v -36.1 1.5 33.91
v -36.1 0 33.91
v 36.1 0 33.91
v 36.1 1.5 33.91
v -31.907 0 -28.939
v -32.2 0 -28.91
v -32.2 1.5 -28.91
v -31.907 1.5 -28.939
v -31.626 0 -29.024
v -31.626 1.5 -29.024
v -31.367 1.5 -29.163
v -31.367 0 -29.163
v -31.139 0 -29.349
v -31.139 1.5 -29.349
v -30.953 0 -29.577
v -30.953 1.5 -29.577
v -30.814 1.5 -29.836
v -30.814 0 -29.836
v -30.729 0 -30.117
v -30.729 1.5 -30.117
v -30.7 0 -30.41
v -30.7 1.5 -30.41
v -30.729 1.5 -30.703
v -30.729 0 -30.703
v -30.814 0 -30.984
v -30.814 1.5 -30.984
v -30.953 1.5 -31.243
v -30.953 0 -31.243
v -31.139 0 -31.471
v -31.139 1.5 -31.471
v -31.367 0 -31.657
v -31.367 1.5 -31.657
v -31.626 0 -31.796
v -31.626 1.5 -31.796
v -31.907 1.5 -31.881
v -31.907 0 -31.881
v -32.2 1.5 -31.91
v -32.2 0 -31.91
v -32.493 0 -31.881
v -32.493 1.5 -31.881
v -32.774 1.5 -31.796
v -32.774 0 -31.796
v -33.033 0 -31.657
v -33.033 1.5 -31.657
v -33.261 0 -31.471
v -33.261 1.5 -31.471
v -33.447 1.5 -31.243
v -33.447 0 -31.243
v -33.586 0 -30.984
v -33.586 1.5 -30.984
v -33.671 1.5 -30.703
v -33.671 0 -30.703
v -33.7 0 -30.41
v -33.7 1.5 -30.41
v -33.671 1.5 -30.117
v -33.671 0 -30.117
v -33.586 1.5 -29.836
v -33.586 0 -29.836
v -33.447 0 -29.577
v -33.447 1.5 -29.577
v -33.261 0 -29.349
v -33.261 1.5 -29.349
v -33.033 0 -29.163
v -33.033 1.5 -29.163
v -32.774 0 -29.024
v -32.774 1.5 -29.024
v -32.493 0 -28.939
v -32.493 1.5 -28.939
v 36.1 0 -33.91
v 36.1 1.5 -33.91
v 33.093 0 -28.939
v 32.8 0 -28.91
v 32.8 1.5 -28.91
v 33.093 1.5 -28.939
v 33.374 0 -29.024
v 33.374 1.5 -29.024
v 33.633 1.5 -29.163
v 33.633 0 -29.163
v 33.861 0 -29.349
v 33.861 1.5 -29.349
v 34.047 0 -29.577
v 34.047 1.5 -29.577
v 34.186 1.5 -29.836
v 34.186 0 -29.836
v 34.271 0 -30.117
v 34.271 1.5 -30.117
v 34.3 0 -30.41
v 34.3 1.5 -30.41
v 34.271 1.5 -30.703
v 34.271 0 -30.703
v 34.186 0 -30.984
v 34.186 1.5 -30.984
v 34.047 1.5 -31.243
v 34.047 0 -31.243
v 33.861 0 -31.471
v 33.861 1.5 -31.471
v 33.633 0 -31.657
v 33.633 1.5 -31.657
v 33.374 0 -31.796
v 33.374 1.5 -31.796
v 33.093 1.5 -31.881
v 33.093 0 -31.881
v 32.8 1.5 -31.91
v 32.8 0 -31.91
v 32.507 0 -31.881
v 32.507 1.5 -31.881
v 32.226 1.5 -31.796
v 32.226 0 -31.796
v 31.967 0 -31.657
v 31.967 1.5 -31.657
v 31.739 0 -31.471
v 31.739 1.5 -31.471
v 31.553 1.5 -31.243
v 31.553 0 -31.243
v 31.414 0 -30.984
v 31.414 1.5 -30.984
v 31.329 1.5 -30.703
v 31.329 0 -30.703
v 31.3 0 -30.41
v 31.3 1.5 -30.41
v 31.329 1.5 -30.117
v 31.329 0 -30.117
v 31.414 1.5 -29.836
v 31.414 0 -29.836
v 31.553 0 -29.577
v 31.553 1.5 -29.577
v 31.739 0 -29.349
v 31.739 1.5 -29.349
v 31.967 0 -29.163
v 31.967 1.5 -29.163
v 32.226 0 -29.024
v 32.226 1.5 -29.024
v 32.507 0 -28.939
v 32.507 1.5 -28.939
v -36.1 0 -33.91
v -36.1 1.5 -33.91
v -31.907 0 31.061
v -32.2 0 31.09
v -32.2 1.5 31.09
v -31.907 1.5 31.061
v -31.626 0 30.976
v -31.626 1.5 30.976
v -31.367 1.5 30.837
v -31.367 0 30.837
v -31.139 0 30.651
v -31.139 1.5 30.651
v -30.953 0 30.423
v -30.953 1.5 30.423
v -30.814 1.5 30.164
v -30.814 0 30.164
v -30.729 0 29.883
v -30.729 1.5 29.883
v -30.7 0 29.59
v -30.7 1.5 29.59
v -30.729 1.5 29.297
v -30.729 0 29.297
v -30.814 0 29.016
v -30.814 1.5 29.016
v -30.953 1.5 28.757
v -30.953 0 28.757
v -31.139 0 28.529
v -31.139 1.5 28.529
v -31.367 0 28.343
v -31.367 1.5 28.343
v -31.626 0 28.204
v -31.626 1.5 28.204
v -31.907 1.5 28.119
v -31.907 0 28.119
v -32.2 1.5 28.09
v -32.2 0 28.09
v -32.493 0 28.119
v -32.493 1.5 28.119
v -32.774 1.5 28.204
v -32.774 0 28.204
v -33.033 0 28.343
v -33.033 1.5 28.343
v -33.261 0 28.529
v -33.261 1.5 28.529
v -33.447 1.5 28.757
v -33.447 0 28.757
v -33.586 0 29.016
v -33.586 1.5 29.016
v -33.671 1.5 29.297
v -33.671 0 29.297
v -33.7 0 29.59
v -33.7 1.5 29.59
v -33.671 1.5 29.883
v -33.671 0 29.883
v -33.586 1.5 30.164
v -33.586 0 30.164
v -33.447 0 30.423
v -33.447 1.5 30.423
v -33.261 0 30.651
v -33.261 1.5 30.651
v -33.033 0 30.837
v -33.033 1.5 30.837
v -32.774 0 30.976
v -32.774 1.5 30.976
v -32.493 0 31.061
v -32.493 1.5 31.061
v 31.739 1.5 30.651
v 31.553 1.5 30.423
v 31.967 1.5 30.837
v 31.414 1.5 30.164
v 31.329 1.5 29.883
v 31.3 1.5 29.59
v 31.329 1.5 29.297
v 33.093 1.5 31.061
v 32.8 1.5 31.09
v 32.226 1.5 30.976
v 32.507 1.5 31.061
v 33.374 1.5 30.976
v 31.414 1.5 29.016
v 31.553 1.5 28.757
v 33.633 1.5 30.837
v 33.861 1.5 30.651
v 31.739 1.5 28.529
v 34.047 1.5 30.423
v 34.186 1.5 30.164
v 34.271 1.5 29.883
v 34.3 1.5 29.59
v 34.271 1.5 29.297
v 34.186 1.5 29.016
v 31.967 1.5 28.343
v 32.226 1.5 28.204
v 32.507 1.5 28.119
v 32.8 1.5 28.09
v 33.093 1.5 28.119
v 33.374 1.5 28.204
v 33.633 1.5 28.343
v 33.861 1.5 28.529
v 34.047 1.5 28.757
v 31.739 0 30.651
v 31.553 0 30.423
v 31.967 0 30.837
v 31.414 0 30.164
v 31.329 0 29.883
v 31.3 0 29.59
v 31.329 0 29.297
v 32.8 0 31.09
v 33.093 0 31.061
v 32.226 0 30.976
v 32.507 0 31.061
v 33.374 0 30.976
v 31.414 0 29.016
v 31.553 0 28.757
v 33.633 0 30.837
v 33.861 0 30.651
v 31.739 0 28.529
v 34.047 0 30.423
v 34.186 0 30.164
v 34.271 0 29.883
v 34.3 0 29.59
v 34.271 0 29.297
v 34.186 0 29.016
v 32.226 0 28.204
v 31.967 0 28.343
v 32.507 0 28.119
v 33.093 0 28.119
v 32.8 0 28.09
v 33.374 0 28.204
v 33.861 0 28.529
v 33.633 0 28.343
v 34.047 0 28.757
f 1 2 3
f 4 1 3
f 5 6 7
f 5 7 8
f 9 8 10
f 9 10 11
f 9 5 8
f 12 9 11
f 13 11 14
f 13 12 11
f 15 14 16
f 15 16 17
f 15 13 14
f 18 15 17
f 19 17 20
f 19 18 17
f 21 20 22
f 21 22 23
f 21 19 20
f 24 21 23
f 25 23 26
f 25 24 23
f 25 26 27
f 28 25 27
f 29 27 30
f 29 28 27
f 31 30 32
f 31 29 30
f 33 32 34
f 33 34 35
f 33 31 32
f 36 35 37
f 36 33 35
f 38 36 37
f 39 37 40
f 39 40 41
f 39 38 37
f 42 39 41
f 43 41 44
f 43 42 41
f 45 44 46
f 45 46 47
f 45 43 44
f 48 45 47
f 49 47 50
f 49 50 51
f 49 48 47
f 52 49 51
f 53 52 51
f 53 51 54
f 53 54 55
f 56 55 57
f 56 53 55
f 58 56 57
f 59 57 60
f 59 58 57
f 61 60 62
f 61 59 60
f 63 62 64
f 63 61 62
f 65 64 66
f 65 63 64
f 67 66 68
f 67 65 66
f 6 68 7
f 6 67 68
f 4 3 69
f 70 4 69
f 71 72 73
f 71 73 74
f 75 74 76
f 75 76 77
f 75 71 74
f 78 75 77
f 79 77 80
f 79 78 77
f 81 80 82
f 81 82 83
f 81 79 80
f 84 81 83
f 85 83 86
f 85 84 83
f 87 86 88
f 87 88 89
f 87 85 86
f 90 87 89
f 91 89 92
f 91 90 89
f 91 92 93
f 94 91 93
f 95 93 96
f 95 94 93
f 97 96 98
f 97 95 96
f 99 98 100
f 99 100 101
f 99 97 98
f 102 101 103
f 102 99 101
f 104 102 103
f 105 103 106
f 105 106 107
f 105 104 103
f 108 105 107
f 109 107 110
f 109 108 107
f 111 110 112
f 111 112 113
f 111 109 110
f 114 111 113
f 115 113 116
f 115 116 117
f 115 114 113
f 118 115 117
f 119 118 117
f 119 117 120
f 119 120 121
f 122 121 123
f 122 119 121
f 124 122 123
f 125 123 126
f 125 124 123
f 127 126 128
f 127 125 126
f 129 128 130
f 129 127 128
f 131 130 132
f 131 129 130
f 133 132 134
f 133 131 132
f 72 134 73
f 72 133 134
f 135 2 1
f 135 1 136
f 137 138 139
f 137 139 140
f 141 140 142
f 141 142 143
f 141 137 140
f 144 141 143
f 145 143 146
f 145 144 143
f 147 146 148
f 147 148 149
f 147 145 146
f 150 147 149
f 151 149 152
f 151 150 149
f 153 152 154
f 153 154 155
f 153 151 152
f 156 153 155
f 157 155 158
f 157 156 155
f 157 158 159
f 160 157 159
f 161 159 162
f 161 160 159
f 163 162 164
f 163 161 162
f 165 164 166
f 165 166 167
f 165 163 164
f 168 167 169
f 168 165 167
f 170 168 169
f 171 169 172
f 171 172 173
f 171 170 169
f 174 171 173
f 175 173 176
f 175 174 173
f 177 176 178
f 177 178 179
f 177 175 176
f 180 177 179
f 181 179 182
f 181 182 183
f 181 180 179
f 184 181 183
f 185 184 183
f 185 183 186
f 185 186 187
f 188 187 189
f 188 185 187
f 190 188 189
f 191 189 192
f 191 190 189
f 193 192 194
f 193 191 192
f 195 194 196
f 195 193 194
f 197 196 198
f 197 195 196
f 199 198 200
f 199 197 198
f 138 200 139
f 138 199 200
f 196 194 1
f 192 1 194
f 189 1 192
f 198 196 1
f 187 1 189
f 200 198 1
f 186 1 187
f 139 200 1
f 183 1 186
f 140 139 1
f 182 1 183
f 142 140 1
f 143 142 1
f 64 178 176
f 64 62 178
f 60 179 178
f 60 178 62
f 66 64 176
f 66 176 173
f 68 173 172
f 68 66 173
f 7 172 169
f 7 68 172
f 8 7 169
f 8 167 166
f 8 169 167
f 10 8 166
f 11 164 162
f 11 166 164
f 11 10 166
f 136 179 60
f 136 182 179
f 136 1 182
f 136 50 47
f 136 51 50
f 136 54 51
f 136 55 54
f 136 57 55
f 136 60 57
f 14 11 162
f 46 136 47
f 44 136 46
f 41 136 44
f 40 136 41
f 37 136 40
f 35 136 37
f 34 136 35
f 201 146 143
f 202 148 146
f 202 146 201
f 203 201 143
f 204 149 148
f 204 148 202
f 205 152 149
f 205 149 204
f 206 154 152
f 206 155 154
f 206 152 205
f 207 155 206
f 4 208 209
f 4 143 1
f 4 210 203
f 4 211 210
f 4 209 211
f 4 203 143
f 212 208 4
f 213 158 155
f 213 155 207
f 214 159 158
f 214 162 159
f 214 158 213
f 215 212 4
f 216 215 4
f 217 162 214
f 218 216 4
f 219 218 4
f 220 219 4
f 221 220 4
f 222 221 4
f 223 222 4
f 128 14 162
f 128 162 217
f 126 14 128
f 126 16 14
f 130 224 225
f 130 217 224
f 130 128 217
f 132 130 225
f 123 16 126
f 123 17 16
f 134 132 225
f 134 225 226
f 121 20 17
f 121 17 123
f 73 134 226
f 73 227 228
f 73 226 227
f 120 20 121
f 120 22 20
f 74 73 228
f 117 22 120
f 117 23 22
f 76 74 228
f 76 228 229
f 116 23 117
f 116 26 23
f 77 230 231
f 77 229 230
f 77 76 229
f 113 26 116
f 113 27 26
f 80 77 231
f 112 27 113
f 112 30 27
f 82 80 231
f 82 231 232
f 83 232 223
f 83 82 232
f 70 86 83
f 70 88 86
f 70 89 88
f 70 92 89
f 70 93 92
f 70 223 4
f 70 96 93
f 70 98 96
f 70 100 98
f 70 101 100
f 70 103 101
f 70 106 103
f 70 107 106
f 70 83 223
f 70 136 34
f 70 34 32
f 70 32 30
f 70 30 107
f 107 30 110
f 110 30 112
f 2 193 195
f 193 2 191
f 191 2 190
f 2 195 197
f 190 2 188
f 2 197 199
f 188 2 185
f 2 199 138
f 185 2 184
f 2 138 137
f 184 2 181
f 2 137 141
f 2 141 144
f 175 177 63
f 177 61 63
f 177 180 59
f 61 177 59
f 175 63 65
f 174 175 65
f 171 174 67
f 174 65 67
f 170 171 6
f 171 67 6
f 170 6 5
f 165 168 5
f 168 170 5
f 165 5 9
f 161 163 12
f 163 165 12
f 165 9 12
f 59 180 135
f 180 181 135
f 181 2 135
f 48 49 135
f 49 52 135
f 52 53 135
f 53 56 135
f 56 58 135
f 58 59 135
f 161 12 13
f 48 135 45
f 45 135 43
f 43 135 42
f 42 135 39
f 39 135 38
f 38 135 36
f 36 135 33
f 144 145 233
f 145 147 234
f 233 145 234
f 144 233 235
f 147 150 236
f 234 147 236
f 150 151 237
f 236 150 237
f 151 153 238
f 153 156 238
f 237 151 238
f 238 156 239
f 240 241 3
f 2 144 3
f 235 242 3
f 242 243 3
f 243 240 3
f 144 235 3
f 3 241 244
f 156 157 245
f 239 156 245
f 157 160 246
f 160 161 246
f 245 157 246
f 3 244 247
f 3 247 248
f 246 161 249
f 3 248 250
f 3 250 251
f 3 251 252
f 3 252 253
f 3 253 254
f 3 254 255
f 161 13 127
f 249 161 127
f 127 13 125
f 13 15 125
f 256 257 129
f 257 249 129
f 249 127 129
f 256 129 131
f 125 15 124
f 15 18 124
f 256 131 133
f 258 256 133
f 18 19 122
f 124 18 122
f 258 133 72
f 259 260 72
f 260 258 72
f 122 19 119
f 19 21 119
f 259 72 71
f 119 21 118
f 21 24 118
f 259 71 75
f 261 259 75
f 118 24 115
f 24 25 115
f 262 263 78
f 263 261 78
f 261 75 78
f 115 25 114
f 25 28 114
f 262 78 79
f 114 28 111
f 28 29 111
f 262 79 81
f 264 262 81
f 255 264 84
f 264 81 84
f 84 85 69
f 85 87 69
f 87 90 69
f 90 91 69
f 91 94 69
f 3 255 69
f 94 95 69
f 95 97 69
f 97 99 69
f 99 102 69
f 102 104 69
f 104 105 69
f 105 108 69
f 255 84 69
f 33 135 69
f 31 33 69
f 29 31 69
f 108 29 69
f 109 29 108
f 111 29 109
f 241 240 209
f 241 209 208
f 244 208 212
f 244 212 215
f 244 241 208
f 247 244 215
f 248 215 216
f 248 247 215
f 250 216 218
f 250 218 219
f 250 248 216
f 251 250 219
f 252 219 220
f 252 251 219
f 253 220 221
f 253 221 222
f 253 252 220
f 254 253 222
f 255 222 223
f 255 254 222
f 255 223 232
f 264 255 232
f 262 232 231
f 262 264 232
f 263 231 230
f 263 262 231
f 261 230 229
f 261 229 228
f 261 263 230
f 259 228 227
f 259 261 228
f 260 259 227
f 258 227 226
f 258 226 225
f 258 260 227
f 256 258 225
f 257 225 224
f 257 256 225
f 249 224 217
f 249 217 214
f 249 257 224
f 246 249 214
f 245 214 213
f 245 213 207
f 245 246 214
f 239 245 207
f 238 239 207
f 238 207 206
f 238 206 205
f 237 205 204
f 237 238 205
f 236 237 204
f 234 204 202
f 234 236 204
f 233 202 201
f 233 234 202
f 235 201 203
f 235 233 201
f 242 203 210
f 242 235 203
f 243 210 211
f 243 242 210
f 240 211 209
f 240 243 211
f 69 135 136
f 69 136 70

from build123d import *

# Parameters (mm, degrees)
ESQUISSE1_W        = 72.2
ESQUISSE1_H        = 67.82
ESQUISSE1_R        = 1.5
BOSS_EXTRU_1_DEPTH = 1.5
ESQUISSE1_4_W      = 72.2
ESQUISSE1_4_H      = 67.82
ESQUISSE1_4_R      = 1.5
ESQUISSE1_4_W_2    = 60
ESQUISSE1_4_H_2    = 30
BOSS_EXTRU_2_DEPTH = 1.5


with BuildPart() as part:
    # Esquisse1 → Boss.-Extru.1 (new body)
    with BuildSketch(Plane(origin=(0, 0, 0), x_dir=(1, 0, 0), z_dir=(0, 1, 0))):
        Rectangle(ESQUISSE1_W, ESQUISSE1_H)
        with Locations((-32.2, 30.41)):
            Circle(ESQUISSE1_R, mode=Mode.SUBTRACT)
        with Locations((32.8, 30.41)):
            Circle(ESQUISSE1_R, mode=Mode.SUBTRACT)
        with Locations((-32.2, -29.59)):
            Circle(ESQUISSE1_R, mode=Mode.SUBTRACT)
        with Locations((32.8, -29.59)):
            Circle(ESQUISSE1_R, mode=Mode.SUBTRACT)
    extrude(amount=BOSS_EXTRU_1_DEPTH)

    # Esquisse1<4> → Boss.-Extru.2 (add)
    with BuildSketch(Plane(origin=(0, 0, 0), x_dir=(1, 0, 0), z_dir=(0, 1, 0))):
        Rectangle(ESQUISSE1_4_W, ESQUISSE1_4_H)
        with Locations((-32.2, 30.41)):
            Circle(ESQUISSE1_4_R, mode=Mode.SUBTRACT)
        with Locations((32.8, 30.41)):
            Circle(ESQUISSE1_4_R, mode=Mode.SUBTRACT)
        with Locations((-32.2, -29.59)):
            Circle(ESQUISSE1_4_R, mode=Mode.SUBTRACT)
        with Locations((32.8, -29.59)):
            Circle(ESQUISSE1_4_R, mode=Mode.SUBTRACT)
        with Locations((-0.3, 3.91)):
            Rectangle(ESQUISSE1_4_W_2, ESQUISSE1_4_H_2, mode=Mode.SUBTRACT)
    extrude(amount=BOSS_EXTRU_2_DEPTH)


solid = part.part
